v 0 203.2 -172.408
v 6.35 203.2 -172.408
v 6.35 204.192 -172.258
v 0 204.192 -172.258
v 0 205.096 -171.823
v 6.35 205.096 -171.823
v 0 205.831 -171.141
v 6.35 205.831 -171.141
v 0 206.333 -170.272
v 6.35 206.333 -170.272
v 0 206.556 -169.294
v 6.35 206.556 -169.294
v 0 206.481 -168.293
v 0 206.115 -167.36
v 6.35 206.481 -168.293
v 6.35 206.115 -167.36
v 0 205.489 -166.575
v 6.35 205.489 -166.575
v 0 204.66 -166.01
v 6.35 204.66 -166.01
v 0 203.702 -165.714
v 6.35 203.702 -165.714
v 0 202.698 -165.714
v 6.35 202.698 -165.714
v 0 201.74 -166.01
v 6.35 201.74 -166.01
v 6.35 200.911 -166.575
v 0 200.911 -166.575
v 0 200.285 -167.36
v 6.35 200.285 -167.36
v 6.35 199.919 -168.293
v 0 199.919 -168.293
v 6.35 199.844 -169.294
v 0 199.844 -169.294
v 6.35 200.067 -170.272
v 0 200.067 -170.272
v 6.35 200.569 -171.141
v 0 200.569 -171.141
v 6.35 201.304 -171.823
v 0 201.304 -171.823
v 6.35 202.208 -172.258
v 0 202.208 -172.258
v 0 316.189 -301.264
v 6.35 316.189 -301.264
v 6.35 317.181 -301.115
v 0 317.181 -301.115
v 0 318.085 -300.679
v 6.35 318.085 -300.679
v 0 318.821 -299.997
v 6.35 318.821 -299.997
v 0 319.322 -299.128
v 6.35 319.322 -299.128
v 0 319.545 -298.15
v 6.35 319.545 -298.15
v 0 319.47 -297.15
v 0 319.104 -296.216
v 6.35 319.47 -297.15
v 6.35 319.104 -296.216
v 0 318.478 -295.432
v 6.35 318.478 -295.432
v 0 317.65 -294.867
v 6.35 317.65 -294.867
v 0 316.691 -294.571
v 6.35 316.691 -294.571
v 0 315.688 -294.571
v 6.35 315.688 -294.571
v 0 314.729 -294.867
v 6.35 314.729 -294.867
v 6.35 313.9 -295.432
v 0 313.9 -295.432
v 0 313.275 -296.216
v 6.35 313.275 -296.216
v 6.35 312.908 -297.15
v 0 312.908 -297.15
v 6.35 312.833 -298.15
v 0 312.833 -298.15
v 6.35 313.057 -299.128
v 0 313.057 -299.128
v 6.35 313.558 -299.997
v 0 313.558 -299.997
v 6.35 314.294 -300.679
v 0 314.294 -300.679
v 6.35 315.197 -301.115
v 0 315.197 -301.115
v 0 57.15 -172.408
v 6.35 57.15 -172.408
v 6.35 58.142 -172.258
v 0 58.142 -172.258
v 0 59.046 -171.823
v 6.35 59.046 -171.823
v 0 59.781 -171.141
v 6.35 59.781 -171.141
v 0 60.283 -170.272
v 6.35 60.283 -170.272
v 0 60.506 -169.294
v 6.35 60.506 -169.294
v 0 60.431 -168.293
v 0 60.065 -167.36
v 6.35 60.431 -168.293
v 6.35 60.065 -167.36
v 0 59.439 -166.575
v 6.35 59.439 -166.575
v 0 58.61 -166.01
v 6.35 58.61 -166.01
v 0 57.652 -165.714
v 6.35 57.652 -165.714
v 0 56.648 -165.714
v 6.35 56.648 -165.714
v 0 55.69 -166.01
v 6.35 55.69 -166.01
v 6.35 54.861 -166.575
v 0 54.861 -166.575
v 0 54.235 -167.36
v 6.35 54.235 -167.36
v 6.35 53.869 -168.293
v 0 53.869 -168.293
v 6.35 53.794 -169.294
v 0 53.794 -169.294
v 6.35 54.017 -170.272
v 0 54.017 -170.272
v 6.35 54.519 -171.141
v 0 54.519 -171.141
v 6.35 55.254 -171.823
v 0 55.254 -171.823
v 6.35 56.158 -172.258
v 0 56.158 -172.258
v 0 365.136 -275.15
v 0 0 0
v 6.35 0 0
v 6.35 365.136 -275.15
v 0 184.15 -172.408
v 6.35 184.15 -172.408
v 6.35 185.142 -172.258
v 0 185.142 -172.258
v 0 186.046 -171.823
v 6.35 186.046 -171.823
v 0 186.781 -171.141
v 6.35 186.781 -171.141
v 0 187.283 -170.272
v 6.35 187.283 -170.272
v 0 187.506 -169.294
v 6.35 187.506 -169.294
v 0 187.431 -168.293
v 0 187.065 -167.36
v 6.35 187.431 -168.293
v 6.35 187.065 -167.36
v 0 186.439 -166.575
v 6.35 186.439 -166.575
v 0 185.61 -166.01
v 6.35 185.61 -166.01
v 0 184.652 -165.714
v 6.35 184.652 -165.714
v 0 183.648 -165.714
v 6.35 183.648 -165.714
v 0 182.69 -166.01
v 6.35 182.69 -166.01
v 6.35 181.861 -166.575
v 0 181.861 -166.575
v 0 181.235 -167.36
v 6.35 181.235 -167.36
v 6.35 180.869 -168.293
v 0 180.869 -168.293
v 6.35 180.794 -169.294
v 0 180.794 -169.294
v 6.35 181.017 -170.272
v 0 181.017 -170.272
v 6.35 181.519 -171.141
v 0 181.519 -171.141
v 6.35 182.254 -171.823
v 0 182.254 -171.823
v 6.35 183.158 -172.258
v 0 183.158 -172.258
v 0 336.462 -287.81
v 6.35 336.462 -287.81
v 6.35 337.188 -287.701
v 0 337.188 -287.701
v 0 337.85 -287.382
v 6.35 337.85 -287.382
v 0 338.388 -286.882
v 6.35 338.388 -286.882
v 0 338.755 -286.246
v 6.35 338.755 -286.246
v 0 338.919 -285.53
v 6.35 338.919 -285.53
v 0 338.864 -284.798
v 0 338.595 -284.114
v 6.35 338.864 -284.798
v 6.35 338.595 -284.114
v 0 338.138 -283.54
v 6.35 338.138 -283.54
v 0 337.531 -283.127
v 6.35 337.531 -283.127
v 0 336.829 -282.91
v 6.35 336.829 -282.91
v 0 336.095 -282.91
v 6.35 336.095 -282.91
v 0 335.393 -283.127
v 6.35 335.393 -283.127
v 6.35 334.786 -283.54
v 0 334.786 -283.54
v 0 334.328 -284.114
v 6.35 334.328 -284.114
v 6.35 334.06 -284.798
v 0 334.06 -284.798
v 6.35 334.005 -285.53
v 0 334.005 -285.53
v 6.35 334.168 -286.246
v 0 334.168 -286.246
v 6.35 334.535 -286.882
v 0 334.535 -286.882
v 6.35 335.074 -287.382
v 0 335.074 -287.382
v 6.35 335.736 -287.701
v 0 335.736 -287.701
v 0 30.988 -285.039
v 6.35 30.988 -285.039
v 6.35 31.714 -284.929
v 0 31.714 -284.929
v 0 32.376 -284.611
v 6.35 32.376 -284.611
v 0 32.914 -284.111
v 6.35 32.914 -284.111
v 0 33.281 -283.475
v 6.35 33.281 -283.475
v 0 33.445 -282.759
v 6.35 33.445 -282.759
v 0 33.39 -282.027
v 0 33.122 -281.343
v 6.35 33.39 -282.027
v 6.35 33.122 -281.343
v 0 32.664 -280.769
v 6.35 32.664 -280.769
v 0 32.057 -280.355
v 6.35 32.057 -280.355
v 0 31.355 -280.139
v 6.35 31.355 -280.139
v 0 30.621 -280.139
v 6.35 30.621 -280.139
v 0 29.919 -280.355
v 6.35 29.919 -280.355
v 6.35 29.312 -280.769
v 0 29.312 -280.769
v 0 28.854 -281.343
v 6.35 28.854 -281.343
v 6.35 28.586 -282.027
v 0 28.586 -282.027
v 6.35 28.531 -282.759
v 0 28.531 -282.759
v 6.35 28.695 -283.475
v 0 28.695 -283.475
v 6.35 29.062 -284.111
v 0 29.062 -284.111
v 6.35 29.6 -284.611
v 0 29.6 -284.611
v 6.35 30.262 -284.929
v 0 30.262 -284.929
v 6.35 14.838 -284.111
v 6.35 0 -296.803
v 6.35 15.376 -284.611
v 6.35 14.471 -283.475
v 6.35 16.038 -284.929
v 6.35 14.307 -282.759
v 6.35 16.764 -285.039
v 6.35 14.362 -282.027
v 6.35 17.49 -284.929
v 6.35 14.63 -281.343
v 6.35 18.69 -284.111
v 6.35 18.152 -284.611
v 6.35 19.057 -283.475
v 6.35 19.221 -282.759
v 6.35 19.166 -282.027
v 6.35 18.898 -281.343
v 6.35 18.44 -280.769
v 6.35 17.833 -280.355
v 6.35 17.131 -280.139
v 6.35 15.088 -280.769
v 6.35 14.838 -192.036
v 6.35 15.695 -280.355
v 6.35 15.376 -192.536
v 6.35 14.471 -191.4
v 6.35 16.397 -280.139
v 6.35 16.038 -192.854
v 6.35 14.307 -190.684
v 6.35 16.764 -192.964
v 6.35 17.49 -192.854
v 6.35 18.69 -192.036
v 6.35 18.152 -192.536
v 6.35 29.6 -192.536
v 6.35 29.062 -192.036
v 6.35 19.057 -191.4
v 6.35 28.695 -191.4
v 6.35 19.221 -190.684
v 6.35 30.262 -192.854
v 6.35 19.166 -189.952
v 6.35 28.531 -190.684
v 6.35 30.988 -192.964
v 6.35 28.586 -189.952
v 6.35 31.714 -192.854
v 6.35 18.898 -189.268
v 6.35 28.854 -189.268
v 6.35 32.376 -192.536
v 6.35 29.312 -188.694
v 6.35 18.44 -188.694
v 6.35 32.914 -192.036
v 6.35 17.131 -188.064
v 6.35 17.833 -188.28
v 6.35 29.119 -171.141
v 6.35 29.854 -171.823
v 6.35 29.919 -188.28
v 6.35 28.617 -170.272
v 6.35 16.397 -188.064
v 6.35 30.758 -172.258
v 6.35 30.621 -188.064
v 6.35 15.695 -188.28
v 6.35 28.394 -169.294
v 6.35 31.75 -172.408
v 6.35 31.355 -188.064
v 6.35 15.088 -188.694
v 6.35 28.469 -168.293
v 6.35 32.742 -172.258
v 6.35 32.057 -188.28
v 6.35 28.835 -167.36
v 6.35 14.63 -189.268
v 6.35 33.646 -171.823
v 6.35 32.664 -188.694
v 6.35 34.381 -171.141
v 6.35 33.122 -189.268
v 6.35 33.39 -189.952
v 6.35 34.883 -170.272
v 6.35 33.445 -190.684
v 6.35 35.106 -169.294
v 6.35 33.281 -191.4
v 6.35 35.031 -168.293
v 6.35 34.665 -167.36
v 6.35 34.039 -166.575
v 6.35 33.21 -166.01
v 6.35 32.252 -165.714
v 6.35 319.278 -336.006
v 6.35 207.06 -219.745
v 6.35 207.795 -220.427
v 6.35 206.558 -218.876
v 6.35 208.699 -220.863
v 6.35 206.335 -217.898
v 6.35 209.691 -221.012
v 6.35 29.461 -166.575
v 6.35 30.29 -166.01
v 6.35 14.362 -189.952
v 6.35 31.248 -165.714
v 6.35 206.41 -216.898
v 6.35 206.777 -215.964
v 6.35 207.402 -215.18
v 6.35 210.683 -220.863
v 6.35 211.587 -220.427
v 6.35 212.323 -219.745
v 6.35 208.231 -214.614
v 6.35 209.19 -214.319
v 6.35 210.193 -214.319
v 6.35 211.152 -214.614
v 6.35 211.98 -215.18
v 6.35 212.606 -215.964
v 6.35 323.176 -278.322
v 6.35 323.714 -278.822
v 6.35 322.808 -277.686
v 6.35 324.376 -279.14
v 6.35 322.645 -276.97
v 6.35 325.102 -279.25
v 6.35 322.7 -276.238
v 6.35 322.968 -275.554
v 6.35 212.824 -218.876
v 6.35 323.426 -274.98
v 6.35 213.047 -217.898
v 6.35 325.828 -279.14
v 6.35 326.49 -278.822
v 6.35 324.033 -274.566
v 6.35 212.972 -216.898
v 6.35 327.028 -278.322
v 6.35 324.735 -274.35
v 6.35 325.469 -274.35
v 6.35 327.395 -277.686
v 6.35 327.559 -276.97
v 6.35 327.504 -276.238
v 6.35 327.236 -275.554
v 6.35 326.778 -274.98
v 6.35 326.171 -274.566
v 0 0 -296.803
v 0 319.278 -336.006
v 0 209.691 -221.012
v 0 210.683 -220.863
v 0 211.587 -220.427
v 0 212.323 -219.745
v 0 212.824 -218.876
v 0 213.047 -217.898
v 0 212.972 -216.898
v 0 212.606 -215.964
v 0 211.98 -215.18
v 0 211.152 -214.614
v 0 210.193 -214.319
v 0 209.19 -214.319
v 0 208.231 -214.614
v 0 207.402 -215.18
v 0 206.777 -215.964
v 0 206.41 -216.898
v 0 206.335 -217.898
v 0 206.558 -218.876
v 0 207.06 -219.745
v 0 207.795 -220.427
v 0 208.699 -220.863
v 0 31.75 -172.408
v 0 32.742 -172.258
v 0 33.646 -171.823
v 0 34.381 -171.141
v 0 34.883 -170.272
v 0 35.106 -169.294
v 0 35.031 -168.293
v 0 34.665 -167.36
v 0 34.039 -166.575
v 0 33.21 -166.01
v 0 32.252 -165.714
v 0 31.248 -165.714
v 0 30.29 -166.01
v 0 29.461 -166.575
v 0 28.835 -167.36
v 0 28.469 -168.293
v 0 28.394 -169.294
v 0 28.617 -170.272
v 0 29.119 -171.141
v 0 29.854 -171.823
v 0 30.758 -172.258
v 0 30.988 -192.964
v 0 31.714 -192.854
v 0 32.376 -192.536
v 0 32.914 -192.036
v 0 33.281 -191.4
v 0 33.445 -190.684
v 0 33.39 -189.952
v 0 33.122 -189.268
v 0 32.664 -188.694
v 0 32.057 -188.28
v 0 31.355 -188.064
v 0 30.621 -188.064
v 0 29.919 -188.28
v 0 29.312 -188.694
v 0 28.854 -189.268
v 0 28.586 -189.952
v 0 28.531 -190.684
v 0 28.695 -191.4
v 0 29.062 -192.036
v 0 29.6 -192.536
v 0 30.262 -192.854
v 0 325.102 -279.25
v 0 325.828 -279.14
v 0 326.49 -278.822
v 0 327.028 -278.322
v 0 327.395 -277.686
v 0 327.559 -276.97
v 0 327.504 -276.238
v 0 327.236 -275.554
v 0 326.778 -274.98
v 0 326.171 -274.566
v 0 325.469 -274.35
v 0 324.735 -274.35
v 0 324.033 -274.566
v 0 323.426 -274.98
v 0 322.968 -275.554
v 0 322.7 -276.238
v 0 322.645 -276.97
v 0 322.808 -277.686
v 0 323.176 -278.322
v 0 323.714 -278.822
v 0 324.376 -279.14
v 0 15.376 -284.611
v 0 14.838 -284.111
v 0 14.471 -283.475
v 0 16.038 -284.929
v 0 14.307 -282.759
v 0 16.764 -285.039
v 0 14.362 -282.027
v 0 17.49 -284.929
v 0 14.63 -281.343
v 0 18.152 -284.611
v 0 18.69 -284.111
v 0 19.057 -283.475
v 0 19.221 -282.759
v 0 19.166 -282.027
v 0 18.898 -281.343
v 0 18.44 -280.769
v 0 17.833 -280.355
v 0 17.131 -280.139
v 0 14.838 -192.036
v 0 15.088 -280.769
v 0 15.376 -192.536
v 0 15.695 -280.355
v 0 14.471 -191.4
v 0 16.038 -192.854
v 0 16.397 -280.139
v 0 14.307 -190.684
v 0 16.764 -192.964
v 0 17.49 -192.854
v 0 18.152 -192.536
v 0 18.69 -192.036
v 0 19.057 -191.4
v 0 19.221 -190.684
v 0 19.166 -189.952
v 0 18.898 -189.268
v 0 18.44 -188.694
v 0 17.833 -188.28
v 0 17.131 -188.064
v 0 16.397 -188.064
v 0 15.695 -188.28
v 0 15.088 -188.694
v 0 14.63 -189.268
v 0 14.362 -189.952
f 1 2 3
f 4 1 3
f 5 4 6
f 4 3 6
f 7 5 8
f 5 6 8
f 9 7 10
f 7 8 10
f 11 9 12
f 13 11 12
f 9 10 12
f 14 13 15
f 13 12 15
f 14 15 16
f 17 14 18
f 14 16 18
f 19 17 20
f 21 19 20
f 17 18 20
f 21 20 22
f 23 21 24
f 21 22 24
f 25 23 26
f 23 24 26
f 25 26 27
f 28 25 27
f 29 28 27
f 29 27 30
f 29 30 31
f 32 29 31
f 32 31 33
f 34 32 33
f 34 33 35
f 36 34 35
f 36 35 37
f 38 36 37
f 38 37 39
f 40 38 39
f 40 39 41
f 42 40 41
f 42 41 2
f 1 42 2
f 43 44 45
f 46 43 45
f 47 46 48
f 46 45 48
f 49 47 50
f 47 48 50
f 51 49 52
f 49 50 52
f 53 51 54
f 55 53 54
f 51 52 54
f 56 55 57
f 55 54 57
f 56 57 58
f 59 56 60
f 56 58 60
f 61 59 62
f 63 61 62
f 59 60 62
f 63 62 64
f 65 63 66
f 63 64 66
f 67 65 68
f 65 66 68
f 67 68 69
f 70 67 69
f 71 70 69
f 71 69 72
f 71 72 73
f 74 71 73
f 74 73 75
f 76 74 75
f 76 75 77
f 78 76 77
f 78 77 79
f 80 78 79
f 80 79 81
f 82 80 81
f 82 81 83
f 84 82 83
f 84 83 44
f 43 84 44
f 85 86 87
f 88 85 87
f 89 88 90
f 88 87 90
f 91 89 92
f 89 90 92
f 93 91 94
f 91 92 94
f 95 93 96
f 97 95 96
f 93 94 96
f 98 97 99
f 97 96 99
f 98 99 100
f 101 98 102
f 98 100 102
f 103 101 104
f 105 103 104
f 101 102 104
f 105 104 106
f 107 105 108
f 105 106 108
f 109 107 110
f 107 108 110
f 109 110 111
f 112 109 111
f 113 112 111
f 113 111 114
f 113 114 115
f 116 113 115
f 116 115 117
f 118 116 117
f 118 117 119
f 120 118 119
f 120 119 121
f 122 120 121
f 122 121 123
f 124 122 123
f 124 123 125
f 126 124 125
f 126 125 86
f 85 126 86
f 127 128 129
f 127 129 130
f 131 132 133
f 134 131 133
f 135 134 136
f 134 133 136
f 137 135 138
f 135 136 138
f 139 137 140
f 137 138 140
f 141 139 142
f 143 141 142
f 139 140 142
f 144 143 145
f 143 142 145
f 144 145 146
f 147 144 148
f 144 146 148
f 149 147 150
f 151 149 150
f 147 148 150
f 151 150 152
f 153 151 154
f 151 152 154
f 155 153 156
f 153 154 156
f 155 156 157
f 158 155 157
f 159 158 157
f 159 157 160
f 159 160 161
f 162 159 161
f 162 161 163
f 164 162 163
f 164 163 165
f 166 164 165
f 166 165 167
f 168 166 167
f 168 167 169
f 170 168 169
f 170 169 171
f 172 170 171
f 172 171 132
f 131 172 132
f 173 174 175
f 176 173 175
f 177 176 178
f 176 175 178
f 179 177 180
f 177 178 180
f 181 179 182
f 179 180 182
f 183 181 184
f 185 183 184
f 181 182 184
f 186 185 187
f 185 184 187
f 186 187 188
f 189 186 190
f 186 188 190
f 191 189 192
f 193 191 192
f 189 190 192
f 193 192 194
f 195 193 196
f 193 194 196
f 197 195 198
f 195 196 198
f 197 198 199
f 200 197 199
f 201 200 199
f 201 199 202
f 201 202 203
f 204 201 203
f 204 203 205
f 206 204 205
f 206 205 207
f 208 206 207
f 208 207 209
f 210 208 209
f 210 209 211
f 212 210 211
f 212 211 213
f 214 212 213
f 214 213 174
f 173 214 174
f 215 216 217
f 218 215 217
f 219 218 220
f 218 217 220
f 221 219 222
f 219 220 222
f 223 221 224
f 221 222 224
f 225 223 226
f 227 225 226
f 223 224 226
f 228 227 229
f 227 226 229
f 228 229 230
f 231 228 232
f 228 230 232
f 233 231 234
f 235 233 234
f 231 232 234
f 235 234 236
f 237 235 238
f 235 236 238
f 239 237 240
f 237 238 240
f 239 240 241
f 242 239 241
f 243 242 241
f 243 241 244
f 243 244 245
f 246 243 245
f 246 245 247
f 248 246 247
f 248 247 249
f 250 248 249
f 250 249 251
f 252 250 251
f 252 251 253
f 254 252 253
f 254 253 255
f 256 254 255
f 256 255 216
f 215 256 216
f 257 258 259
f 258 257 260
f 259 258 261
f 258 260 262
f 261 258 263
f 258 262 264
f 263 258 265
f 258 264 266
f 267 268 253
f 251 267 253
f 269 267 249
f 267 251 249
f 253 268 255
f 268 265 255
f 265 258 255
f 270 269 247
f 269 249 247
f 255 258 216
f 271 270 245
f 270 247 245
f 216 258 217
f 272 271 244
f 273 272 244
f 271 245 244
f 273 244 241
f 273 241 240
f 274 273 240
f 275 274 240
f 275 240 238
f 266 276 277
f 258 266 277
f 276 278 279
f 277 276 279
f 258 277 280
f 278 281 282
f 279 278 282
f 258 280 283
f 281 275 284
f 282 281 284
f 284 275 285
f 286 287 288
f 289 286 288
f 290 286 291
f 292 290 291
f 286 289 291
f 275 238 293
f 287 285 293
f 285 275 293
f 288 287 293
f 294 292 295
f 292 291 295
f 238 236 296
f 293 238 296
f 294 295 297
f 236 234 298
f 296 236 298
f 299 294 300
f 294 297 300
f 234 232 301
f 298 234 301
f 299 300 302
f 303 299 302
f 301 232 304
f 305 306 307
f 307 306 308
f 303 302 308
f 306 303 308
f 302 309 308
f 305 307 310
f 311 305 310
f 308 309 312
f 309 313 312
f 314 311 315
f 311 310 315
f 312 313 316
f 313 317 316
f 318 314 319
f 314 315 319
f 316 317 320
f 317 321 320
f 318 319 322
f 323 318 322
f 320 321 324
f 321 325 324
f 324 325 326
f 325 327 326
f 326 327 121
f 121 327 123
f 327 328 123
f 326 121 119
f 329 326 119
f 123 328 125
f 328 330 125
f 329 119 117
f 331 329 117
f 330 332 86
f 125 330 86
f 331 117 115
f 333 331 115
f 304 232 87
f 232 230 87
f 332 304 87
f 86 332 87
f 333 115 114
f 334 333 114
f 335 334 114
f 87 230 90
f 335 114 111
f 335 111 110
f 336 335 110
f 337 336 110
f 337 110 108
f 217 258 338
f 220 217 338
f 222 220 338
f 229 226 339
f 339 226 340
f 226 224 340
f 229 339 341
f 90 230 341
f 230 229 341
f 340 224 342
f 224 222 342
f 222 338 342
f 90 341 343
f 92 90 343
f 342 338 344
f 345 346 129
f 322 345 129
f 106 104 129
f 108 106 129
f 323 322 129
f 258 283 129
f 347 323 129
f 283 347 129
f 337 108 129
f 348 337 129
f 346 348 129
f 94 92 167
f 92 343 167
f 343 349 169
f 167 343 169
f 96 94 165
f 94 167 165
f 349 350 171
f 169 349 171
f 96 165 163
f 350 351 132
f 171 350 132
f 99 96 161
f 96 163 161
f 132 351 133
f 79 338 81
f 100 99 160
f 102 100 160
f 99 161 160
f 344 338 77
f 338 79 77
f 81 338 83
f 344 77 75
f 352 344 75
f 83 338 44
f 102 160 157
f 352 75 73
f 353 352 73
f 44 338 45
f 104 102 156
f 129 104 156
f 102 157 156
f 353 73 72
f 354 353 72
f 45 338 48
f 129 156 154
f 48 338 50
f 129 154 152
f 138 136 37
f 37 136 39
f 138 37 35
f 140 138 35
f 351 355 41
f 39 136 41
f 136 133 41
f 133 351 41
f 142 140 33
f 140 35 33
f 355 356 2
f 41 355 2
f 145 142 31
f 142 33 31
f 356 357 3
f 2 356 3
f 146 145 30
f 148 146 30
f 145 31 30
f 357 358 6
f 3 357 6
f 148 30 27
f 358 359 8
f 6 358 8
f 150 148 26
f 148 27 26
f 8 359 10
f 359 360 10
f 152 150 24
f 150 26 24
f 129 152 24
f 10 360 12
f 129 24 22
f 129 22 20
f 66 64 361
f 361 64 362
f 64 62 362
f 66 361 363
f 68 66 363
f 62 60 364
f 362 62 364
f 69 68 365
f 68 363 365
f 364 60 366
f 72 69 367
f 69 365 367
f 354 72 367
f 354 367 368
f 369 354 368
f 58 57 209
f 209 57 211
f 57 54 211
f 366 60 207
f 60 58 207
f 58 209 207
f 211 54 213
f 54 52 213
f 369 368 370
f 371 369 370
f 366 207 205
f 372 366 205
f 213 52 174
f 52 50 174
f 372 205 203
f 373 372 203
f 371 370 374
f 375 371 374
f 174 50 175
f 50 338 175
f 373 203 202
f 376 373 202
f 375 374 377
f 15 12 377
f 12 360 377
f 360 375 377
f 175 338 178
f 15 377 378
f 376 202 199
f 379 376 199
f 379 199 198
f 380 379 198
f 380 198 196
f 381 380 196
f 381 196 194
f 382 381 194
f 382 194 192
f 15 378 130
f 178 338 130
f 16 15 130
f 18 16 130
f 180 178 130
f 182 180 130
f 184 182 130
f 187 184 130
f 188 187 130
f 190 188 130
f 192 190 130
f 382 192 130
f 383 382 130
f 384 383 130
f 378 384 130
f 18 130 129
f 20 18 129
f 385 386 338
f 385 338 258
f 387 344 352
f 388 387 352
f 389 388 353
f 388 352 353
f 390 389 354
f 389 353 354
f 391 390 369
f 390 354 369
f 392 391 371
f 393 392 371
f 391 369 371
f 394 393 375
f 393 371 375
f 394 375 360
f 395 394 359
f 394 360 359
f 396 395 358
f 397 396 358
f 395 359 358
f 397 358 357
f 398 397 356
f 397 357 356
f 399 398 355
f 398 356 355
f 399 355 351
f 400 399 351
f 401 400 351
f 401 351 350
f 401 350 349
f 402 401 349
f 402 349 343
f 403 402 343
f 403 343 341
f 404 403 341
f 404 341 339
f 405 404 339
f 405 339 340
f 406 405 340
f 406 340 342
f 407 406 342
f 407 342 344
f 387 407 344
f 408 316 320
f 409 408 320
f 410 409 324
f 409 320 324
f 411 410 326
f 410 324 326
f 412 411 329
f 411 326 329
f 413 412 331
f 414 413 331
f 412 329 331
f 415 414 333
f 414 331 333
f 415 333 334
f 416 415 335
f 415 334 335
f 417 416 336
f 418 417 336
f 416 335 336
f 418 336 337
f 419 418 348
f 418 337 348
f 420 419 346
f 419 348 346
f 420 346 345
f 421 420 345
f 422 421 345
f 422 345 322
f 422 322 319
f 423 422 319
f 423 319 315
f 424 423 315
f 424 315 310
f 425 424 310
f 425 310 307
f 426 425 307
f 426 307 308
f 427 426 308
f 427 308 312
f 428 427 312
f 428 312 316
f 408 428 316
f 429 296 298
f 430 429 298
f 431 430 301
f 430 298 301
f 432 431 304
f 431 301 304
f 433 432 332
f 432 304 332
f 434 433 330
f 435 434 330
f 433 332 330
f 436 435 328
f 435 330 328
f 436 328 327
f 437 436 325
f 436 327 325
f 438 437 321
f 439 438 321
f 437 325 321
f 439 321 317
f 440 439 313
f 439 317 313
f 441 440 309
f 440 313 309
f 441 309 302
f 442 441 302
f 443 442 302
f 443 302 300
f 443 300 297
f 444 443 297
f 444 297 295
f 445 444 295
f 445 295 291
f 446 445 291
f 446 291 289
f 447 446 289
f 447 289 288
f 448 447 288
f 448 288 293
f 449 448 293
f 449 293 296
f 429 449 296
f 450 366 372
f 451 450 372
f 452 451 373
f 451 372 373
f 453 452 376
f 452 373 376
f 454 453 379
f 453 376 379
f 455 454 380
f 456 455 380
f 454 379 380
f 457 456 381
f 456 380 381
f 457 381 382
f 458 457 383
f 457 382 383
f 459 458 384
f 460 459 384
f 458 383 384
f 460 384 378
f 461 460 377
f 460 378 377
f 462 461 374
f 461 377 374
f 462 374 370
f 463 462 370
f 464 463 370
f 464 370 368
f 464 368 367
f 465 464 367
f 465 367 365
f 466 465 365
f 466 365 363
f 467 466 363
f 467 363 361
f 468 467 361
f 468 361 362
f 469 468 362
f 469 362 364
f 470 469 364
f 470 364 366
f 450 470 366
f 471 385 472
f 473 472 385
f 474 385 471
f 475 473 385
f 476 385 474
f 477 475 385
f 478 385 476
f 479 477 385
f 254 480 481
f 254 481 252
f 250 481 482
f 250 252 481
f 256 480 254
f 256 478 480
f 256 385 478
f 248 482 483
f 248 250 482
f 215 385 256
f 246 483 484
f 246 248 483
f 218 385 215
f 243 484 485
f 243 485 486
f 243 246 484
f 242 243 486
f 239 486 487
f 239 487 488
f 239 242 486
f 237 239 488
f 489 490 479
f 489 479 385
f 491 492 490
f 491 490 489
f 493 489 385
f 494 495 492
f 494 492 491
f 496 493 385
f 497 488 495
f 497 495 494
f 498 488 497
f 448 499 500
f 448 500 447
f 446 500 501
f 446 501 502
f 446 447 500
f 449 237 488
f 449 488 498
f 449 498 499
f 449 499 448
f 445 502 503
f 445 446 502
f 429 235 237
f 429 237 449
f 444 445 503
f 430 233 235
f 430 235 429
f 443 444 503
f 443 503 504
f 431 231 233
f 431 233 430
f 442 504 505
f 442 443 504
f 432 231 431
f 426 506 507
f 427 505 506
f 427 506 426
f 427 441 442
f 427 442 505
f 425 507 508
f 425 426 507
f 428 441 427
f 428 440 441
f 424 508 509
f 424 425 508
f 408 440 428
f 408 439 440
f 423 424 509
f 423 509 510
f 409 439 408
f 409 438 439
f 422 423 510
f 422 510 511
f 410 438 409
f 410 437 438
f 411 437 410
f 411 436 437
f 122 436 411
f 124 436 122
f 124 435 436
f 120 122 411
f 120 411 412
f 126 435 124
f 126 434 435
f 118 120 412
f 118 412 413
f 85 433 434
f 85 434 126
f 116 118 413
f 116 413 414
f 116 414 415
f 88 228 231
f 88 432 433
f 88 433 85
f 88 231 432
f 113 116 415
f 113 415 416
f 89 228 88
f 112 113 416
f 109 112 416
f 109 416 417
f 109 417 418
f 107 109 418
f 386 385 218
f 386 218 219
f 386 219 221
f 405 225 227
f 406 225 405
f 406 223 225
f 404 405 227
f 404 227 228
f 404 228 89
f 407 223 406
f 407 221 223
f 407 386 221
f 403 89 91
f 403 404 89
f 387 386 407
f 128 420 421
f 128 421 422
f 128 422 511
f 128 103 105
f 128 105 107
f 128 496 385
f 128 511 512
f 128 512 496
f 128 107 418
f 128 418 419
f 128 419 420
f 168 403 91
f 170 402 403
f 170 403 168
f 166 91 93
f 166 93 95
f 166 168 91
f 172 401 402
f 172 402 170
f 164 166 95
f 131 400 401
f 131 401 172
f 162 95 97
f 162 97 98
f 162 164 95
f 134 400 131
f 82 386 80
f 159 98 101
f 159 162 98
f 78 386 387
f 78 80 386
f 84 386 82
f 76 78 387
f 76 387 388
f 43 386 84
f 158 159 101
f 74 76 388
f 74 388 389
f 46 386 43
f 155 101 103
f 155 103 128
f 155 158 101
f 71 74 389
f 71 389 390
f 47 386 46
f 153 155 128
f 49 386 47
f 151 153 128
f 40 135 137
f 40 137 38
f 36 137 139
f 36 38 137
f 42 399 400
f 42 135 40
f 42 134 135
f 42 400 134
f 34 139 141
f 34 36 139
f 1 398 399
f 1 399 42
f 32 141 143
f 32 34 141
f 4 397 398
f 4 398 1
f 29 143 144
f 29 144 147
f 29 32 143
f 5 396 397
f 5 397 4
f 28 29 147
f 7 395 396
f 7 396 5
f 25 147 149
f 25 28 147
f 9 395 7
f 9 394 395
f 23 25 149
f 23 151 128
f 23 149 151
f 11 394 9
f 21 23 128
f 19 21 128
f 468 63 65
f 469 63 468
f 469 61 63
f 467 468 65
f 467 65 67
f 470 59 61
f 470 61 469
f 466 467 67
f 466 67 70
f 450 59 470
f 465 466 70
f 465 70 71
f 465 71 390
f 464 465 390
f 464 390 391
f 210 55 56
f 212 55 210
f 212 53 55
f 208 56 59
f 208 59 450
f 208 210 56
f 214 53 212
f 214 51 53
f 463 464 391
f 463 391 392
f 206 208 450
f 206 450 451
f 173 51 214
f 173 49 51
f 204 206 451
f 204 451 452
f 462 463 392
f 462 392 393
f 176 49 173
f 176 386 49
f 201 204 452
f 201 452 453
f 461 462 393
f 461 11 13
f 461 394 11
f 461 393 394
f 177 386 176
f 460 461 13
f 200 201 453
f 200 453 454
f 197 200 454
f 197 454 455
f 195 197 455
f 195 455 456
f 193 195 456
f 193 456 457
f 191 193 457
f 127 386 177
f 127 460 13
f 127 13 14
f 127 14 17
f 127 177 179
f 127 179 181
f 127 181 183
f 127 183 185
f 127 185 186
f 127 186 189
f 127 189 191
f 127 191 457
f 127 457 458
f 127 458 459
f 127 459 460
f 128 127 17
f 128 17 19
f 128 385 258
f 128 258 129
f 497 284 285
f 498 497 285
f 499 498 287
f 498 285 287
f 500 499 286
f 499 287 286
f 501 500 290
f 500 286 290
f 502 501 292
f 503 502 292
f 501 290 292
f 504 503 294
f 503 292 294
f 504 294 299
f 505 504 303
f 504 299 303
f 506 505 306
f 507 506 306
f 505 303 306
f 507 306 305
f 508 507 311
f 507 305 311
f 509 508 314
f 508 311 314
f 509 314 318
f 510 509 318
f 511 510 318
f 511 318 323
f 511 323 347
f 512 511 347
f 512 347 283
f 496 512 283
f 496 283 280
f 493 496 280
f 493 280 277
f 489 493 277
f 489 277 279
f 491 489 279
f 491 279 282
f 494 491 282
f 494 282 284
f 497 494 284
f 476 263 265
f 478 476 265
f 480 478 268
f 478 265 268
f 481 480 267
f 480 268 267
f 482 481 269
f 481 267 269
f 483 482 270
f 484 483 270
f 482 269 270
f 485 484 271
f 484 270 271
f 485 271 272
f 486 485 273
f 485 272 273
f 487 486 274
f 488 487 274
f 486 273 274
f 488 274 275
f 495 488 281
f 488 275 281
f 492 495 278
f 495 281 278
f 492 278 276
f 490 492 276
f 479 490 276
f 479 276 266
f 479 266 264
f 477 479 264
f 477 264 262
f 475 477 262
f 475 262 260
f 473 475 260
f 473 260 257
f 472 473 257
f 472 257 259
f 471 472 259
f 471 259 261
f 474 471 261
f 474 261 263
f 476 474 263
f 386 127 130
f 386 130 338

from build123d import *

# Parameters (mm, degrees)
BOSS_EXTRUDE1_DEPTH = 6.35
SKETCH2_R           = 3.3655
CUT_EXTRUDE1_DEPTH  = 7.35
SKETCH3_R           = 2.4638
CUT_EXTRUDE2_DEPTH  = 7.35
SKETCH4_R           = 3.3655
CUT_EXTRUDE3_DEPTH  = 7.35


with BuildPart() as part:
    # Sketch1 → Boss-Extrude1 (new body)
    with BuildSketch(Plane(origin=(0, 0, 0), x_dir=(0, 0, -1), z_dir=(1, 0, 0))):
        Polygon((0, 0), (275.149828585, 365.136155194), (336.005854451, 319.277850429), (296.80346378, 0), align=None)
    extrude(amount=BOSS_EXTRUDE1_DEPTH)

    # Sketch2 → Cut-Extrude1 (cut, through all)
    with BuildSketch(Plane(origin=(6.35, 0, 0), x_dir=(0, 0, -1), z_dir=(1, 0, 0))):
        with Locations((169.042319417, 203.2)):
            Circle(SKETCH2_R)
        with Locations((169.042319417, 184.15)):
            Circle(SKETCH2_R)
        with Locations((169.042319417, 57.15)):
            Circle(SKETCH2_R)
        with Locations((169.042319417, 31.75)):
            Circle(SKETCH2_R)
    extrude(amount=-CUT_EXTRUDE1_DEPTH, mode=Mode.SUBTRACT)

    # Sketch3 → Cut-Extrude2 (cut, through all)
    with BuildSketch(Plane(origin=(6.35, 0, 0), x_dir=(0, 0, -1), z_dir=(1, 0, 0))):
        with Locations((190.5, 30.988)):
            Circle(SKETCH3_R)
        with Locations((190.5, 16.764)):
            Circle(SKETCH3_R)
        with Locations((282.575, 30.988)):
            Circle(SKETCH3_R)
        with Locations((282.575, 16.764)):
            Circle(SKETCH3_R)
        with Locations((285.346343492, 336.461727915)):
            Circle(SKETCH3_R)
        with Locations((276.786126603, 325.10193642)):
            Circle(SKETCH3_R)
    extrude(amount=-CUT_EXTRUDE2_DEPTH, mode=Mode.SUBTRACT)

    # Sketch4 → Cut-Extrude3 (cut, through all)
    with BuildSketch(Plane(origin=(6.35, 0, 0), x_dir=(0, 0, -1), z_dir=(1, 0, 0))):
        with Locations((297.898743163, 316.189372761)):
            Circle(SKETCH4_R)
        with Locations((217.646709826, 209.691327496)):
            Circle(SKETCH4_R)
    extrude(amount=-CUT_EXTRUDE3_DEPTH, mode=Mode.SUBTRACT)


solid = part.part
